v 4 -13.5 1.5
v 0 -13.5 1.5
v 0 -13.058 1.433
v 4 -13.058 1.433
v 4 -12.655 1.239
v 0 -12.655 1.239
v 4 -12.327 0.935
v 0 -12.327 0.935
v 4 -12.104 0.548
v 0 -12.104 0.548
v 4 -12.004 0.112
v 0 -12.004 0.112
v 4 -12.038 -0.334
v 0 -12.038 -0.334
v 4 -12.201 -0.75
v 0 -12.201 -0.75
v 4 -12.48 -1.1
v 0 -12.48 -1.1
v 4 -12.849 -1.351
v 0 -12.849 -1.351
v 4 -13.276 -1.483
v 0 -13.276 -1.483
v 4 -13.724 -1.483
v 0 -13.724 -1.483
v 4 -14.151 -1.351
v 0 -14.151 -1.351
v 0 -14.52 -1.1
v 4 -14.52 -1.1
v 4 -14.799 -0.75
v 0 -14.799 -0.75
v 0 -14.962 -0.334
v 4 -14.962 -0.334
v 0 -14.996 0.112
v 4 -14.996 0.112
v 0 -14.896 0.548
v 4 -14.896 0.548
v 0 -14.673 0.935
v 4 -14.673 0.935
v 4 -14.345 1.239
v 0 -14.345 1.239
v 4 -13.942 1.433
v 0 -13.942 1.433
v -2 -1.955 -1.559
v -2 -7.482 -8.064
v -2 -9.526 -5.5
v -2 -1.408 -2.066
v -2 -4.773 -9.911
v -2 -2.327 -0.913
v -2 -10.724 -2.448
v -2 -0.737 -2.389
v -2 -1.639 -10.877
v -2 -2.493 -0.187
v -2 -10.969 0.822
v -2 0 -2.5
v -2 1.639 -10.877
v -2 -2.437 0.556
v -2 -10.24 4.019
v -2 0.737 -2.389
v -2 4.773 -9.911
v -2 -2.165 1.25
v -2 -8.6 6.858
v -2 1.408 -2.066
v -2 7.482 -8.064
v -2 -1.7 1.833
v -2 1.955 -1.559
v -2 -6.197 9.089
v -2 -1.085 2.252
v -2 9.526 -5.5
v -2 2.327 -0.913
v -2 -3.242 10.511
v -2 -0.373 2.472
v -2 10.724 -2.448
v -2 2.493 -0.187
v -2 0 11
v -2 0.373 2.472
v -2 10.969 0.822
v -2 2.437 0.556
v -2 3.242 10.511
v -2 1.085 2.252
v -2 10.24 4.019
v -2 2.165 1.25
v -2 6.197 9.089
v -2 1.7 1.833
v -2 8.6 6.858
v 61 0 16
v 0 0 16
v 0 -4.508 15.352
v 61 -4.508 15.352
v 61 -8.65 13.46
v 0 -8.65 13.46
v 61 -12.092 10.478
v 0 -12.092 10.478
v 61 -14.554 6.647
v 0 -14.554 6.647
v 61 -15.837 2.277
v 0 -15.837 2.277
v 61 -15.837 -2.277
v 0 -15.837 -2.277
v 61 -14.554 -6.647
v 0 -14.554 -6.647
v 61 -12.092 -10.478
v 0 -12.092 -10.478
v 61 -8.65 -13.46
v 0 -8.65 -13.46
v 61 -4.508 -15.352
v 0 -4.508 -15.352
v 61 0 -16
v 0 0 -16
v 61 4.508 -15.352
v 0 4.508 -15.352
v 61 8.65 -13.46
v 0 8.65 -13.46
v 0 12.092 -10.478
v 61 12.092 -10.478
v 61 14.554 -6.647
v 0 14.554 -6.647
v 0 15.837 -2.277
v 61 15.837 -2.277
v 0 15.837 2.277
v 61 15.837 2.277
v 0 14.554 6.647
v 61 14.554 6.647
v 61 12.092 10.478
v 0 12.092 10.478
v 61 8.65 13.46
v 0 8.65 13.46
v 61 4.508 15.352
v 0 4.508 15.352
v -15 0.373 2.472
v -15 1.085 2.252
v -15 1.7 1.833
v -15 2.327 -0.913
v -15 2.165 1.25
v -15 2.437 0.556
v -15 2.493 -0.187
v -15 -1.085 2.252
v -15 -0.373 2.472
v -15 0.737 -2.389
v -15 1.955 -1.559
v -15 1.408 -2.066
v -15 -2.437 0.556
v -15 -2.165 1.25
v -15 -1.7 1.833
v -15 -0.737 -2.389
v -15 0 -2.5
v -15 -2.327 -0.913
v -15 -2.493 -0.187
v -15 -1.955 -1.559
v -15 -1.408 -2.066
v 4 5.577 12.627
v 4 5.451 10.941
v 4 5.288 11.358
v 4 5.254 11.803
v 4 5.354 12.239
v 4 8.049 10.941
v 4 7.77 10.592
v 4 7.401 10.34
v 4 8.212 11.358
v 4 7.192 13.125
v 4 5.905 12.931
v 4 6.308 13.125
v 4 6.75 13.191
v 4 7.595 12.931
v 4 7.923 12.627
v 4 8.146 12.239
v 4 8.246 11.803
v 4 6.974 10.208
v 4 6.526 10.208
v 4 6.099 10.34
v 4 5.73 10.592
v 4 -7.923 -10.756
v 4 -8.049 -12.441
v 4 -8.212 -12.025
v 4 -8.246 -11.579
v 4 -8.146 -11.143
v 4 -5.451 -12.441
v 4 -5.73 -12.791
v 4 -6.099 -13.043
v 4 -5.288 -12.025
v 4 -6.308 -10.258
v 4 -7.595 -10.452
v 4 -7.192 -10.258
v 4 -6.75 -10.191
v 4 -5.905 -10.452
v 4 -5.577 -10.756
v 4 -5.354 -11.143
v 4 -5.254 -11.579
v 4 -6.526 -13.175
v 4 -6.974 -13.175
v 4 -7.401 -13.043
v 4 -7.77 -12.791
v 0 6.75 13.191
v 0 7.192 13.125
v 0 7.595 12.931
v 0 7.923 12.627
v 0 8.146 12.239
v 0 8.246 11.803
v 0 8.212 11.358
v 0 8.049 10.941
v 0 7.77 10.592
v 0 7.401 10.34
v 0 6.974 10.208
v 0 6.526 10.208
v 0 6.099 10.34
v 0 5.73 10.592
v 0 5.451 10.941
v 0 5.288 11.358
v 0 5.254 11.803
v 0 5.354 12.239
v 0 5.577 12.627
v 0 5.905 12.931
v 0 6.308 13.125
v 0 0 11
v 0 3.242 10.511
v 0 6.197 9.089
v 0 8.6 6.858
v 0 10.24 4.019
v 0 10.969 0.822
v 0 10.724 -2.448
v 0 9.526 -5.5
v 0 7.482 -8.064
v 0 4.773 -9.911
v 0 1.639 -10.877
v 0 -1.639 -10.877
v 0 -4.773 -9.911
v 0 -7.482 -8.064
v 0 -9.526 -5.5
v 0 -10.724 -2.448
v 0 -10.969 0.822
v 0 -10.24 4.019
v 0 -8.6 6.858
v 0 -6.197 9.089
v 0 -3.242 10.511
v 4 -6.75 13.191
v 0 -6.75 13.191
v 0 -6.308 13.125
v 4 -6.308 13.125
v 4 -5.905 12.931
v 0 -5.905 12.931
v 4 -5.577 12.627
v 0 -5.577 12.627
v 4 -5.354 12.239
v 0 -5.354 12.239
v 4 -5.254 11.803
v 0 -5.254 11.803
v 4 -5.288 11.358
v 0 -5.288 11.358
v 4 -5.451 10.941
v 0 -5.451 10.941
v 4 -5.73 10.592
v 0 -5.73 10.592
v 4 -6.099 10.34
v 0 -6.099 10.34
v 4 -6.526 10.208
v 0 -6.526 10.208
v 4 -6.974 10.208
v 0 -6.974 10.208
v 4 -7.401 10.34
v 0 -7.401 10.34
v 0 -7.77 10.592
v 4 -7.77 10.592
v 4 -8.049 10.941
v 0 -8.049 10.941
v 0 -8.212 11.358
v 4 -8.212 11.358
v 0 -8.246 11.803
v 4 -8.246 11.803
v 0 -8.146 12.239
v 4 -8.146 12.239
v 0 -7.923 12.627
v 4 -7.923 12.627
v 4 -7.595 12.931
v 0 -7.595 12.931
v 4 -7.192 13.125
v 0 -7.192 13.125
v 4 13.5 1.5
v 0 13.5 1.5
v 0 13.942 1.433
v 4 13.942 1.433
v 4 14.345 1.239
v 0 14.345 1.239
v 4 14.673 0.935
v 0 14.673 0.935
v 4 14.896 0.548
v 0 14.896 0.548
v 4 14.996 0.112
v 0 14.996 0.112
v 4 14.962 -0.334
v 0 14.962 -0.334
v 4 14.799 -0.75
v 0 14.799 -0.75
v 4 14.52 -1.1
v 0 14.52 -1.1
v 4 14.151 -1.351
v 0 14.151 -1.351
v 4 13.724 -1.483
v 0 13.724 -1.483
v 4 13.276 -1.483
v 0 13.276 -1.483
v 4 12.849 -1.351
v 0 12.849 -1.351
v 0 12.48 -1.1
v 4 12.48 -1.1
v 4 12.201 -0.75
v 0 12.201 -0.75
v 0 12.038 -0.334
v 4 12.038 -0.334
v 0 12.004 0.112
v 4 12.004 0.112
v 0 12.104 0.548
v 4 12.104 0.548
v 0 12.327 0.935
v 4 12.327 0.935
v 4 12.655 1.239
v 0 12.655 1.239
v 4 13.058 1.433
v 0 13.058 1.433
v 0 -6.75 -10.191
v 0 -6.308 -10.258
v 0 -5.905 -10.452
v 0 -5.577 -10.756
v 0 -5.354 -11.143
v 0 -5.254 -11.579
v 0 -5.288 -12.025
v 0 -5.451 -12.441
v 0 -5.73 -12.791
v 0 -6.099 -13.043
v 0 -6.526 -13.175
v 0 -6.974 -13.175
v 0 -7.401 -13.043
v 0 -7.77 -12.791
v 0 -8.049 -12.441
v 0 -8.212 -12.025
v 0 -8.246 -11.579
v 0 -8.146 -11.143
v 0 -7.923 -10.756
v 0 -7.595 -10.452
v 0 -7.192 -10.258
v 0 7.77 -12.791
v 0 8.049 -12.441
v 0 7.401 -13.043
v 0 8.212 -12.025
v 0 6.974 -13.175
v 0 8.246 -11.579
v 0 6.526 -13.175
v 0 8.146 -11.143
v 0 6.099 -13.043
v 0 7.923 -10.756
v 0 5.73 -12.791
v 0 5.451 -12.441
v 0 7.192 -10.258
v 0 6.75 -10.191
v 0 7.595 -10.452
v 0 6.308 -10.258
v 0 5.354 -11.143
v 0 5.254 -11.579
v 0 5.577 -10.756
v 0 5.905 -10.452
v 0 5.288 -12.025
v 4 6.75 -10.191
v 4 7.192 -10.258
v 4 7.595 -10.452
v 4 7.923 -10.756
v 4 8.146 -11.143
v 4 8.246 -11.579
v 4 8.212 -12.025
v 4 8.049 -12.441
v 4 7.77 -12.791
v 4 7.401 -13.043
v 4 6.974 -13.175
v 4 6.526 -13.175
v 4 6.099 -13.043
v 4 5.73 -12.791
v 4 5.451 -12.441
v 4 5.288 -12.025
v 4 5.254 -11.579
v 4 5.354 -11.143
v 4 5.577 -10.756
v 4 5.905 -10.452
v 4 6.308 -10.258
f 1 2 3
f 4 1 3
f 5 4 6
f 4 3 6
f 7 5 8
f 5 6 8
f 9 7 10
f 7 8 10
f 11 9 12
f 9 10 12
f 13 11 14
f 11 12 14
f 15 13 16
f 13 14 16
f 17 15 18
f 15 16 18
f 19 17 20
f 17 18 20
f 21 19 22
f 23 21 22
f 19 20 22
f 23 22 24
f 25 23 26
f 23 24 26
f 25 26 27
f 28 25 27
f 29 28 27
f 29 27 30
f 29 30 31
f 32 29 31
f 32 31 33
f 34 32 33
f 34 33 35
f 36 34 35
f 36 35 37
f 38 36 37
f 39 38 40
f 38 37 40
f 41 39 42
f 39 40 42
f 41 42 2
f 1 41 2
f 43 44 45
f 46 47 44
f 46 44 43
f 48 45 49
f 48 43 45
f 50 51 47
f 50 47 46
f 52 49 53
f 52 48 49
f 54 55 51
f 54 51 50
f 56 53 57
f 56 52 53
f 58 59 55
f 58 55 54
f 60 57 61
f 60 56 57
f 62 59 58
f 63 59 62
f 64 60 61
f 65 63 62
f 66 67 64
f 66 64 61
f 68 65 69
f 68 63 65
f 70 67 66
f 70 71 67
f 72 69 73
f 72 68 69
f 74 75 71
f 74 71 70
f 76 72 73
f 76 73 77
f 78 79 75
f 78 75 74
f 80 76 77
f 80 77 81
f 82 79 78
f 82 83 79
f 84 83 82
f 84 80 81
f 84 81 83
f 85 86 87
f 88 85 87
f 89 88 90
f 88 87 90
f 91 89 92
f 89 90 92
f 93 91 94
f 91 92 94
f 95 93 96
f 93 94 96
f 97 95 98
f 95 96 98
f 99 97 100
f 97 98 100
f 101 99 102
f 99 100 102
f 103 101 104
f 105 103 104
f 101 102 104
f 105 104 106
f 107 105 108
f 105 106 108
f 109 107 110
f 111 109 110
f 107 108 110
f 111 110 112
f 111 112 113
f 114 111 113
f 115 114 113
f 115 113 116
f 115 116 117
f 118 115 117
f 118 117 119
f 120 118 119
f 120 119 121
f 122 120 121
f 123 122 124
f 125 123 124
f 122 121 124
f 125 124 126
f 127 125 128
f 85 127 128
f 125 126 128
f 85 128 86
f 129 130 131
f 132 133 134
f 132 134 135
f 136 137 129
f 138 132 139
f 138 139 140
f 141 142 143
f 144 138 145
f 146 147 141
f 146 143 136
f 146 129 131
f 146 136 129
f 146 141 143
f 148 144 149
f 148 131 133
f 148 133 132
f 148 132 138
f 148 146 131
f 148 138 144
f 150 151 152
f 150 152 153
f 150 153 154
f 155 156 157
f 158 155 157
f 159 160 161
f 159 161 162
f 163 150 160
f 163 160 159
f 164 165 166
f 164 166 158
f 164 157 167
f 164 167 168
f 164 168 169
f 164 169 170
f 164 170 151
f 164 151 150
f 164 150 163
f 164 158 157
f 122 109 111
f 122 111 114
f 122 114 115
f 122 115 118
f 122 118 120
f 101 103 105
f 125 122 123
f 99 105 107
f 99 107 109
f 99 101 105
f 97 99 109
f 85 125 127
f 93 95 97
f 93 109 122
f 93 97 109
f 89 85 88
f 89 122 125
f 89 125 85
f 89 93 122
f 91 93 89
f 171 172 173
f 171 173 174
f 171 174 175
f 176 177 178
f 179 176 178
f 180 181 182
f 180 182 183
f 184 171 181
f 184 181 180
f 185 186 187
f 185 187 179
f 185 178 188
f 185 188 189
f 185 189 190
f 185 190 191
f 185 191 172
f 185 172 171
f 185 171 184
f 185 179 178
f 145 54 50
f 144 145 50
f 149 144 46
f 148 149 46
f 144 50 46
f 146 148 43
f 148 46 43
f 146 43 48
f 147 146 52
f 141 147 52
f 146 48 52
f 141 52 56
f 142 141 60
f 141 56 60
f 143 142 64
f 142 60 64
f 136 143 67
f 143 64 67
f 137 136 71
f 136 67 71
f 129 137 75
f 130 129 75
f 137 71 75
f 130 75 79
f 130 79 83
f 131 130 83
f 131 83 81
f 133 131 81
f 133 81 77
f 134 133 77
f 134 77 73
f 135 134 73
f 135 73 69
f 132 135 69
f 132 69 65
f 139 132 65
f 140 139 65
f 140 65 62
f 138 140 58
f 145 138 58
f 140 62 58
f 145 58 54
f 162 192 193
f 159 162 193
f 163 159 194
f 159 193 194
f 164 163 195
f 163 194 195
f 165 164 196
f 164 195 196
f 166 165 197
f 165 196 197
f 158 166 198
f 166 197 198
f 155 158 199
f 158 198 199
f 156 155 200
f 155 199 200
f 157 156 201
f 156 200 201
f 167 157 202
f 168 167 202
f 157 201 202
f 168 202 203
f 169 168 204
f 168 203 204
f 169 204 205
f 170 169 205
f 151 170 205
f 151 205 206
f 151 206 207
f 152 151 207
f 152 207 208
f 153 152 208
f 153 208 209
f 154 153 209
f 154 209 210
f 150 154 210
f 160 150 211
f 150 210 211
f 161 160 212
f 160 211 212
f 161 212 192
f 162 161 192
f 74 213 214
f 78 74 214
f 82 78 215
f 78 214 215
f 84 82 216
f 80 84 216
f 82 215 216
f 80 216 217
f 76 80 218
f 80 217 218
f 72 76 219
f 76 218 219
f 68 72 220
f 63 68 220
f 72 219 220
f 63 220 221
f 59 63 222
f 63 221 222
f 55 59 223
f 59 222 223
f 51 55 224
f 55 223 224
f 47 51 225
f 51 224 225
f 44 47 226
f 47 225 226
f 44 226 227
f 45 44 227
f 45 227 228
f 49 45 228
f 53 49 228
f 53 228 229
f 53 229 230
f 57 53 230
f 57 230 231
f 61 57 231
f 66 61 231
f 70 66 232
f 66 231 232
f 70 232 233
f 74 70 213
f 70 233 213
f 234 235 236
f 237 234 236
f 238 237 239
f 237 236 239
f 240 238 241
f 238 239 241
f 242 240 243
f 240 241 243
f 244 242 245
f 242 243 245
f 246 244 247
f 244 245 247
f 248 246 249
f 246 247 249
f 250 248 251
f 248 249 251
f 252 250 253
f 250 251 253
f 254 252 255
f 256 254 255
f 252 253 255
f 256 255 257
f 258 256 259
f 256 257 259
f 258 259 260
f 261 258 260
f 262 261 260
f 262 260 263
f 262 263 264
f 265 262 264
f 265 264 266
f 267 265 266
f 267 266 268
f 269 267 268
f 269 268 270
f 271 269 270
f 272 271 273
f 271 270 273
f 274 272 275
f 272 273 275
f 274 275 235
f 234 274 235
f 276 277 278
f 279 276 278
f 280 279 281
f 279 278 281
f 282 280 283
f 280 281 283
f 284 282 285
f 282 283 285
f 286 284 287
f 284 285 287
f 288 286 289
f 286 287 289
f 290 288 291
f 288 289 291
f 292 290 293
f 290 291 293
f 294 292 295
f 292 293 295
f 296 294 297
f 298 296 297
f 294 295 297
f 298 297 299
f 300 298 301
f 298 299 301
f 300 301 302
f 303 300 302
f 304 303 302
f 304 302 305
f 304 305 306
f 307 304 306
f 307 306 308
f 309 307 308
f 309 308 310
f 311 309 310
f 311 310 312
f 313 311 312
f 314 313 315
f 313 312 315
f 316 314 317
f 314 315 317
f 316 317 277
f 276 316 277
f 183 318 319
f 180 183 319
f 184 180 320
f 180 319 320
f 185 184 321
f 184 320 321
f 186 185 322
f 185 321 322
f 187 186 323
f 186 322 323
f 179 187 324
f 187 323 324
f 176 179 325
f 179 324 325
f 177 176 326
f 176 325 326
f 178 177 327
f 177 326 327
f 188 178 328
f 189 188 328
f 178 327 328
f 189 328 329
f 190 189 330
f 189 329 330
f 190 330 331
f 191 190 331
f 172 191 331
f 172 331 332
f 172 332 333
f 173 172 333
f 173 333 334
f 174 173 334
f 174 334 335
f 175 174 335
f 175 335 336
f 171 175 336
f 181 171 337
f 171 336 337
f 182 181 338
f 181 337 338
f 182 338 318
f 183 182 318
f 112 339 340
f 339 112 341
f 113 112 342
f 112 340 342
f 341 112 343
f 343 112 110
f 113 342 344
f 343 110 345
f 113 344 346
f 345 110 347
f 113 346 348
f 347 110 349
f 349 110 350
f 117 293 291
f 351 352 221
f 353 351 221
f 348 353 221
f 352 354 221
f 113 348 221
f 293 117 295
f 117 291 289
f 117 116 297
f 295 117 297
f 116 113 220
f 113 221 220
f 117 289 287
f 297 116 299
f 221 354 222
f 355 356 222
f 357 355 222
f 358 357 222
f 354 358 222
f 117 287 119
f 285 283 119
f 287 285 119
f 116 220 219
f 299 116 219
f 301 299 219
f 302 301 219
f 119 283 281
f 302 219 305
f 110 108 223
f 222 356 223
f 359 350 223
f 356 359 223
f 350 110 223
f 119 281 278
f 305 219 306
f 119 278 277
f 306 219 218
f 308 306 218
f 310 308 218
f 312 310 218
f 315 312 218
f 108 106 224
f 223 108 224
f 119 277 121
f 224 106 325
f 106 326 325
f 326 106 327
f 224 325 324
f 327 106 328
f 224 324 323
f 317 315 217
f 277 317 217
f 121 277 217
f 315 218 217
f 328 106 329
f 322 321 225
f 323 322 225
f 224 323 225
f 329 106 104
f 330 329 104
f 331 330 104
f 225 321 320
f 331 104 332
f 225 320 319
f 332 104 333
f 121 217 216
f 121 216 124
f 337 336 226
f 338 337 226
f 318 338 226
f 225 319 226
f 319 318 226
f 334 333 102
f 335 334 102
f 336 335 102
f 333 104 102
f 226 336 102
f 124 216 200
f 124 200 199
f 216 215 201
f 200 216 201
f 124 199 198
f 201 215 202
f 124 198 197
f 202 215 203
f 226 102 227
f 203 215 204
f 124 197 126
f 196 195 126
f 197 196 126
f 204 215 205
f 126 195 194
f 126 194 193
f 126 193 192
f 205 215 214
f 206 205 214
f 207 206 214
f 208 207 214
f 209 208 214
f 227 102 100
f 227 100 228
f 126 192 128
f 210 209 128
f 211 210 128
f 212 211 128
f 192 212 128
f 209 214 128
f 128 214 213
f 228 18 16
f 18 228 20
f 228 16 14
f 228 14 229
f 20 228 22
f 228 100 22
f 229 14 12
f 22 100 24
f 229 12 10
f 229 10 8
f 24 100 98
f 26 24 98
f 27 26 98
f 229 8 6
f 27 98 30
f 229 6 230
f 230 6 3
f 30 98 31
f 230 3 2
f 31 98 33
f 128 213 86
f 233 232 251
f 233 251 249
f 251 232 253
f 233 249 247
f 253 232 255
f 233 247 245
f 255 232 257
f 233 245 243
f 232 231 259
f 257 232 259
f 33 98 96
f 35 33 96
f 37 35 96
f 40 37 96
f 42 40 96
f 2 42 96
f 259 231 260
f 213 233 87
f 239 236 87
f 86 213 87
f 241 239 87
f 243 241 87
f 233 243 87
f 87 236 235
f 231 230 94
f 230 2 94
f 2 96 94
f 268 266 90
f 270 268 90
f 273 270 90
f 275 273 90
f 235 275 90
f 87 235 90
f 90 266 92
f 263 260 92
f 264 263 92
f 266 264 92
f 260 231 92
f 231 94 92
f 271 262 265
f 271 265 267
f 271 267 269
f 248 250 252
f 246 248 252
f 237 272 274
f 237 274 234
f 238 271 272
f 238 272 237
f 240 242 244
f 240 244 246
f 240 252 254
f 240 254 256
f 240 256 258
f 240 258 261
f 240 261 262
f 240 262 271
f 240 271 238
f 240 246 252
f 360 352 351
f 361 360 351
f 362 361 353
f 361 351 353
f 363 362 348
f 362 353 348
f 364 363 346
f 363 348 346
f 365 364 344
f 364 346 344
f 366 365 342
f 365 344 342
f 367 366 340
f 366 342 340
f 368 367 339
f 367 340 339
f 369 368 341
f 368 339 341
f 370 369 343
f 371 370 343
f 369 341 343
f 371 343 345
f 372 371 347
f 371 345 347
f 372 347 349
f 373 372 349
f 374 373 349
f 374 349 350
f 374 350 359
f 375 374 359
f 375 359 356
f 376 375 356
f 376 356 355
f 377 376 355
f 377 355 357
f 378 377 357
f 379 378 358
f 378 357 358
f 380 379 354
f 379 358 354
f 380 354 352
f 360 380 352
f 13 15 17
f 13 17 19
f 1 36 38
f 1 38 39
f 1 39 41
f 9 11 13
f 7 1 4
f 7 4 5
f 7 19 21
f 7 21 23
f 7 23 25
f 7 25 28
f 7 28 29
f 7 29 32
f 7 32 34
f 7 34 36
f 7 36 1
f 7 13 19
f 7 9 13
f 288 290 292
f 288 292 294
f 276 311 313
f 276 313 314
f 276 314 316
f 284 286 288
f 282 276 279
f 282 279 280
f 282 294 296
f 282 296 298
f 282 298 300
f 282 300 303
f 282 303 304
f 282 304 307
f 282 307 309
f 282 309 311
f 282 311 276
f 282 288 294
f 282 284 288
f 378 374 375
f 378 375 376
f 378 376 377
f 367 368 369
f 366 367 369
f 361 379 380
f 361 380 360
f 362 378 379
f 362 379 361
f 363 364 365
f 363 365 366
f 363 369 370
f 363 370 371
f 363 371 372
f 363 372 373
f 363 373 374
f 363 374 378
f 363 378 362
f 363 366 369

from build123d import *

# Parameters (mm, degrees)
SKETCH1_R           = 16
BOSS_EXTRUDE1_DEPTH = 61
SKETCH2_R           = 11
BOSS_EXTRUDE2_DEPTH = 2
SKETCH3_R           = 1.5
CUT_EXTRUDE1_DEPTH  = 4
SKETCH4_R           = 2.5
BOSS_EXTRUDE3_DEPTH = 13


with BuildPart() as part:
    # Sketch1 → Boss-Extrude1 (new body)
    with BuildSketch(Plane(origin=(0, 0, 0), x_dir=(0, 0, -1), z_dir=(1, 0, 0))):
        with Locations(Location((0, 0, 0), (0, 0, 180))):
            Circle(SKETCH1_R)
    extrude(amount=BOSS_EXTRUDE1_DEPTH)

    # Sketch2 → Boss-Extrude2 (add)
    with BuildSketch(Plane.ZY):
        Circle(SKETCH2_R)
    extrude(amount=BOSS_EXTRUDE2_DEPTH)

    # Sketch3 → Cut-Extrude1 (cut)
    with BuildSketch(Plane.ZY):
        with Locations((0, 13.5)):
            Circle(SKETCH3_R)
        with Locations((11.691342951, 6.75)):
            Circle(SKETCH3_R)
        with Locations((11.691342951, -6.75)):
            Circle(SKETCH3_R)
        with Locations((0, -13.5)):
            Circle(SKETCH3_R)
        with Locations((-11.691342951, -6.75)):
            Circle(SKETCH3_R)
        with Locations((-11.691342951, 6.75)):
            Circle(SKETCH3_R)
    extrude(amount=-CUT_EXTRUDE1_DEPTH, mode=Mode.SUBTRACT)

    # Sketch4 → Boss-Extrude3 (add)
    with BuildSketch(Plane.ZY.offset(2)):
        with Locations(Location((0, 0, 0), (0, 0, 180))):
            Circle(SKETCH4_R)
    extrude(amount=BOSS_EXTRUDE3_DEPTH)


solid = part.part
